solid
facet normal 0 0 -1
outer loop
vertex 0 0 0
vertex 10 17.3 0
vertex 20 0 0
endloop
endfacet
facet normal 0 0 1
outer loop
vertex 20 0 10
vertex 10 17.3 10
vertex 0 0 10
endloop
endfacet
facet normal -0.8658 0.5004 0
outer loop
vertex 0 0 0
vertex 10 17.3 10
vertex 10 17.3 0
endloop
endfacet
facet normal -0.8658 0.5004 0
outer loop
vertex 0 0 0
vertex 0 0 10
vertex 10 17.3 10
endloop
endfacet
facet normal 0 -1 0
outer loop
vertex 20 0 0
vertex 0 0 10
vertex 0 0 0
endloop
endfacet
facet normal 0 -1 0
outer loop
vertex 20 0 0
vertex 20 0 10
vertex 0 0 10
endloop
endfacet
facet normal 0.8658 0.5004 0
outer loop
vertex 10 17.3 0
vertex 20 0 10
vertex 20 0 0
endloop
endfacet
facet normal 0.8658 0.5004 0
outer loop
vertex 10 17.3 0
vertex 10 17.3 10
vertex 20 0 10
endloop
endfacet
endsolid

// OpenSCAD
// Creates a triangle with vertices at the three points shown.
// it is thickness thick (mm)

thickness = 10;
 
linear_extrude(thickness)polygon([[0,0], [10,17.3],[20,0]]);
